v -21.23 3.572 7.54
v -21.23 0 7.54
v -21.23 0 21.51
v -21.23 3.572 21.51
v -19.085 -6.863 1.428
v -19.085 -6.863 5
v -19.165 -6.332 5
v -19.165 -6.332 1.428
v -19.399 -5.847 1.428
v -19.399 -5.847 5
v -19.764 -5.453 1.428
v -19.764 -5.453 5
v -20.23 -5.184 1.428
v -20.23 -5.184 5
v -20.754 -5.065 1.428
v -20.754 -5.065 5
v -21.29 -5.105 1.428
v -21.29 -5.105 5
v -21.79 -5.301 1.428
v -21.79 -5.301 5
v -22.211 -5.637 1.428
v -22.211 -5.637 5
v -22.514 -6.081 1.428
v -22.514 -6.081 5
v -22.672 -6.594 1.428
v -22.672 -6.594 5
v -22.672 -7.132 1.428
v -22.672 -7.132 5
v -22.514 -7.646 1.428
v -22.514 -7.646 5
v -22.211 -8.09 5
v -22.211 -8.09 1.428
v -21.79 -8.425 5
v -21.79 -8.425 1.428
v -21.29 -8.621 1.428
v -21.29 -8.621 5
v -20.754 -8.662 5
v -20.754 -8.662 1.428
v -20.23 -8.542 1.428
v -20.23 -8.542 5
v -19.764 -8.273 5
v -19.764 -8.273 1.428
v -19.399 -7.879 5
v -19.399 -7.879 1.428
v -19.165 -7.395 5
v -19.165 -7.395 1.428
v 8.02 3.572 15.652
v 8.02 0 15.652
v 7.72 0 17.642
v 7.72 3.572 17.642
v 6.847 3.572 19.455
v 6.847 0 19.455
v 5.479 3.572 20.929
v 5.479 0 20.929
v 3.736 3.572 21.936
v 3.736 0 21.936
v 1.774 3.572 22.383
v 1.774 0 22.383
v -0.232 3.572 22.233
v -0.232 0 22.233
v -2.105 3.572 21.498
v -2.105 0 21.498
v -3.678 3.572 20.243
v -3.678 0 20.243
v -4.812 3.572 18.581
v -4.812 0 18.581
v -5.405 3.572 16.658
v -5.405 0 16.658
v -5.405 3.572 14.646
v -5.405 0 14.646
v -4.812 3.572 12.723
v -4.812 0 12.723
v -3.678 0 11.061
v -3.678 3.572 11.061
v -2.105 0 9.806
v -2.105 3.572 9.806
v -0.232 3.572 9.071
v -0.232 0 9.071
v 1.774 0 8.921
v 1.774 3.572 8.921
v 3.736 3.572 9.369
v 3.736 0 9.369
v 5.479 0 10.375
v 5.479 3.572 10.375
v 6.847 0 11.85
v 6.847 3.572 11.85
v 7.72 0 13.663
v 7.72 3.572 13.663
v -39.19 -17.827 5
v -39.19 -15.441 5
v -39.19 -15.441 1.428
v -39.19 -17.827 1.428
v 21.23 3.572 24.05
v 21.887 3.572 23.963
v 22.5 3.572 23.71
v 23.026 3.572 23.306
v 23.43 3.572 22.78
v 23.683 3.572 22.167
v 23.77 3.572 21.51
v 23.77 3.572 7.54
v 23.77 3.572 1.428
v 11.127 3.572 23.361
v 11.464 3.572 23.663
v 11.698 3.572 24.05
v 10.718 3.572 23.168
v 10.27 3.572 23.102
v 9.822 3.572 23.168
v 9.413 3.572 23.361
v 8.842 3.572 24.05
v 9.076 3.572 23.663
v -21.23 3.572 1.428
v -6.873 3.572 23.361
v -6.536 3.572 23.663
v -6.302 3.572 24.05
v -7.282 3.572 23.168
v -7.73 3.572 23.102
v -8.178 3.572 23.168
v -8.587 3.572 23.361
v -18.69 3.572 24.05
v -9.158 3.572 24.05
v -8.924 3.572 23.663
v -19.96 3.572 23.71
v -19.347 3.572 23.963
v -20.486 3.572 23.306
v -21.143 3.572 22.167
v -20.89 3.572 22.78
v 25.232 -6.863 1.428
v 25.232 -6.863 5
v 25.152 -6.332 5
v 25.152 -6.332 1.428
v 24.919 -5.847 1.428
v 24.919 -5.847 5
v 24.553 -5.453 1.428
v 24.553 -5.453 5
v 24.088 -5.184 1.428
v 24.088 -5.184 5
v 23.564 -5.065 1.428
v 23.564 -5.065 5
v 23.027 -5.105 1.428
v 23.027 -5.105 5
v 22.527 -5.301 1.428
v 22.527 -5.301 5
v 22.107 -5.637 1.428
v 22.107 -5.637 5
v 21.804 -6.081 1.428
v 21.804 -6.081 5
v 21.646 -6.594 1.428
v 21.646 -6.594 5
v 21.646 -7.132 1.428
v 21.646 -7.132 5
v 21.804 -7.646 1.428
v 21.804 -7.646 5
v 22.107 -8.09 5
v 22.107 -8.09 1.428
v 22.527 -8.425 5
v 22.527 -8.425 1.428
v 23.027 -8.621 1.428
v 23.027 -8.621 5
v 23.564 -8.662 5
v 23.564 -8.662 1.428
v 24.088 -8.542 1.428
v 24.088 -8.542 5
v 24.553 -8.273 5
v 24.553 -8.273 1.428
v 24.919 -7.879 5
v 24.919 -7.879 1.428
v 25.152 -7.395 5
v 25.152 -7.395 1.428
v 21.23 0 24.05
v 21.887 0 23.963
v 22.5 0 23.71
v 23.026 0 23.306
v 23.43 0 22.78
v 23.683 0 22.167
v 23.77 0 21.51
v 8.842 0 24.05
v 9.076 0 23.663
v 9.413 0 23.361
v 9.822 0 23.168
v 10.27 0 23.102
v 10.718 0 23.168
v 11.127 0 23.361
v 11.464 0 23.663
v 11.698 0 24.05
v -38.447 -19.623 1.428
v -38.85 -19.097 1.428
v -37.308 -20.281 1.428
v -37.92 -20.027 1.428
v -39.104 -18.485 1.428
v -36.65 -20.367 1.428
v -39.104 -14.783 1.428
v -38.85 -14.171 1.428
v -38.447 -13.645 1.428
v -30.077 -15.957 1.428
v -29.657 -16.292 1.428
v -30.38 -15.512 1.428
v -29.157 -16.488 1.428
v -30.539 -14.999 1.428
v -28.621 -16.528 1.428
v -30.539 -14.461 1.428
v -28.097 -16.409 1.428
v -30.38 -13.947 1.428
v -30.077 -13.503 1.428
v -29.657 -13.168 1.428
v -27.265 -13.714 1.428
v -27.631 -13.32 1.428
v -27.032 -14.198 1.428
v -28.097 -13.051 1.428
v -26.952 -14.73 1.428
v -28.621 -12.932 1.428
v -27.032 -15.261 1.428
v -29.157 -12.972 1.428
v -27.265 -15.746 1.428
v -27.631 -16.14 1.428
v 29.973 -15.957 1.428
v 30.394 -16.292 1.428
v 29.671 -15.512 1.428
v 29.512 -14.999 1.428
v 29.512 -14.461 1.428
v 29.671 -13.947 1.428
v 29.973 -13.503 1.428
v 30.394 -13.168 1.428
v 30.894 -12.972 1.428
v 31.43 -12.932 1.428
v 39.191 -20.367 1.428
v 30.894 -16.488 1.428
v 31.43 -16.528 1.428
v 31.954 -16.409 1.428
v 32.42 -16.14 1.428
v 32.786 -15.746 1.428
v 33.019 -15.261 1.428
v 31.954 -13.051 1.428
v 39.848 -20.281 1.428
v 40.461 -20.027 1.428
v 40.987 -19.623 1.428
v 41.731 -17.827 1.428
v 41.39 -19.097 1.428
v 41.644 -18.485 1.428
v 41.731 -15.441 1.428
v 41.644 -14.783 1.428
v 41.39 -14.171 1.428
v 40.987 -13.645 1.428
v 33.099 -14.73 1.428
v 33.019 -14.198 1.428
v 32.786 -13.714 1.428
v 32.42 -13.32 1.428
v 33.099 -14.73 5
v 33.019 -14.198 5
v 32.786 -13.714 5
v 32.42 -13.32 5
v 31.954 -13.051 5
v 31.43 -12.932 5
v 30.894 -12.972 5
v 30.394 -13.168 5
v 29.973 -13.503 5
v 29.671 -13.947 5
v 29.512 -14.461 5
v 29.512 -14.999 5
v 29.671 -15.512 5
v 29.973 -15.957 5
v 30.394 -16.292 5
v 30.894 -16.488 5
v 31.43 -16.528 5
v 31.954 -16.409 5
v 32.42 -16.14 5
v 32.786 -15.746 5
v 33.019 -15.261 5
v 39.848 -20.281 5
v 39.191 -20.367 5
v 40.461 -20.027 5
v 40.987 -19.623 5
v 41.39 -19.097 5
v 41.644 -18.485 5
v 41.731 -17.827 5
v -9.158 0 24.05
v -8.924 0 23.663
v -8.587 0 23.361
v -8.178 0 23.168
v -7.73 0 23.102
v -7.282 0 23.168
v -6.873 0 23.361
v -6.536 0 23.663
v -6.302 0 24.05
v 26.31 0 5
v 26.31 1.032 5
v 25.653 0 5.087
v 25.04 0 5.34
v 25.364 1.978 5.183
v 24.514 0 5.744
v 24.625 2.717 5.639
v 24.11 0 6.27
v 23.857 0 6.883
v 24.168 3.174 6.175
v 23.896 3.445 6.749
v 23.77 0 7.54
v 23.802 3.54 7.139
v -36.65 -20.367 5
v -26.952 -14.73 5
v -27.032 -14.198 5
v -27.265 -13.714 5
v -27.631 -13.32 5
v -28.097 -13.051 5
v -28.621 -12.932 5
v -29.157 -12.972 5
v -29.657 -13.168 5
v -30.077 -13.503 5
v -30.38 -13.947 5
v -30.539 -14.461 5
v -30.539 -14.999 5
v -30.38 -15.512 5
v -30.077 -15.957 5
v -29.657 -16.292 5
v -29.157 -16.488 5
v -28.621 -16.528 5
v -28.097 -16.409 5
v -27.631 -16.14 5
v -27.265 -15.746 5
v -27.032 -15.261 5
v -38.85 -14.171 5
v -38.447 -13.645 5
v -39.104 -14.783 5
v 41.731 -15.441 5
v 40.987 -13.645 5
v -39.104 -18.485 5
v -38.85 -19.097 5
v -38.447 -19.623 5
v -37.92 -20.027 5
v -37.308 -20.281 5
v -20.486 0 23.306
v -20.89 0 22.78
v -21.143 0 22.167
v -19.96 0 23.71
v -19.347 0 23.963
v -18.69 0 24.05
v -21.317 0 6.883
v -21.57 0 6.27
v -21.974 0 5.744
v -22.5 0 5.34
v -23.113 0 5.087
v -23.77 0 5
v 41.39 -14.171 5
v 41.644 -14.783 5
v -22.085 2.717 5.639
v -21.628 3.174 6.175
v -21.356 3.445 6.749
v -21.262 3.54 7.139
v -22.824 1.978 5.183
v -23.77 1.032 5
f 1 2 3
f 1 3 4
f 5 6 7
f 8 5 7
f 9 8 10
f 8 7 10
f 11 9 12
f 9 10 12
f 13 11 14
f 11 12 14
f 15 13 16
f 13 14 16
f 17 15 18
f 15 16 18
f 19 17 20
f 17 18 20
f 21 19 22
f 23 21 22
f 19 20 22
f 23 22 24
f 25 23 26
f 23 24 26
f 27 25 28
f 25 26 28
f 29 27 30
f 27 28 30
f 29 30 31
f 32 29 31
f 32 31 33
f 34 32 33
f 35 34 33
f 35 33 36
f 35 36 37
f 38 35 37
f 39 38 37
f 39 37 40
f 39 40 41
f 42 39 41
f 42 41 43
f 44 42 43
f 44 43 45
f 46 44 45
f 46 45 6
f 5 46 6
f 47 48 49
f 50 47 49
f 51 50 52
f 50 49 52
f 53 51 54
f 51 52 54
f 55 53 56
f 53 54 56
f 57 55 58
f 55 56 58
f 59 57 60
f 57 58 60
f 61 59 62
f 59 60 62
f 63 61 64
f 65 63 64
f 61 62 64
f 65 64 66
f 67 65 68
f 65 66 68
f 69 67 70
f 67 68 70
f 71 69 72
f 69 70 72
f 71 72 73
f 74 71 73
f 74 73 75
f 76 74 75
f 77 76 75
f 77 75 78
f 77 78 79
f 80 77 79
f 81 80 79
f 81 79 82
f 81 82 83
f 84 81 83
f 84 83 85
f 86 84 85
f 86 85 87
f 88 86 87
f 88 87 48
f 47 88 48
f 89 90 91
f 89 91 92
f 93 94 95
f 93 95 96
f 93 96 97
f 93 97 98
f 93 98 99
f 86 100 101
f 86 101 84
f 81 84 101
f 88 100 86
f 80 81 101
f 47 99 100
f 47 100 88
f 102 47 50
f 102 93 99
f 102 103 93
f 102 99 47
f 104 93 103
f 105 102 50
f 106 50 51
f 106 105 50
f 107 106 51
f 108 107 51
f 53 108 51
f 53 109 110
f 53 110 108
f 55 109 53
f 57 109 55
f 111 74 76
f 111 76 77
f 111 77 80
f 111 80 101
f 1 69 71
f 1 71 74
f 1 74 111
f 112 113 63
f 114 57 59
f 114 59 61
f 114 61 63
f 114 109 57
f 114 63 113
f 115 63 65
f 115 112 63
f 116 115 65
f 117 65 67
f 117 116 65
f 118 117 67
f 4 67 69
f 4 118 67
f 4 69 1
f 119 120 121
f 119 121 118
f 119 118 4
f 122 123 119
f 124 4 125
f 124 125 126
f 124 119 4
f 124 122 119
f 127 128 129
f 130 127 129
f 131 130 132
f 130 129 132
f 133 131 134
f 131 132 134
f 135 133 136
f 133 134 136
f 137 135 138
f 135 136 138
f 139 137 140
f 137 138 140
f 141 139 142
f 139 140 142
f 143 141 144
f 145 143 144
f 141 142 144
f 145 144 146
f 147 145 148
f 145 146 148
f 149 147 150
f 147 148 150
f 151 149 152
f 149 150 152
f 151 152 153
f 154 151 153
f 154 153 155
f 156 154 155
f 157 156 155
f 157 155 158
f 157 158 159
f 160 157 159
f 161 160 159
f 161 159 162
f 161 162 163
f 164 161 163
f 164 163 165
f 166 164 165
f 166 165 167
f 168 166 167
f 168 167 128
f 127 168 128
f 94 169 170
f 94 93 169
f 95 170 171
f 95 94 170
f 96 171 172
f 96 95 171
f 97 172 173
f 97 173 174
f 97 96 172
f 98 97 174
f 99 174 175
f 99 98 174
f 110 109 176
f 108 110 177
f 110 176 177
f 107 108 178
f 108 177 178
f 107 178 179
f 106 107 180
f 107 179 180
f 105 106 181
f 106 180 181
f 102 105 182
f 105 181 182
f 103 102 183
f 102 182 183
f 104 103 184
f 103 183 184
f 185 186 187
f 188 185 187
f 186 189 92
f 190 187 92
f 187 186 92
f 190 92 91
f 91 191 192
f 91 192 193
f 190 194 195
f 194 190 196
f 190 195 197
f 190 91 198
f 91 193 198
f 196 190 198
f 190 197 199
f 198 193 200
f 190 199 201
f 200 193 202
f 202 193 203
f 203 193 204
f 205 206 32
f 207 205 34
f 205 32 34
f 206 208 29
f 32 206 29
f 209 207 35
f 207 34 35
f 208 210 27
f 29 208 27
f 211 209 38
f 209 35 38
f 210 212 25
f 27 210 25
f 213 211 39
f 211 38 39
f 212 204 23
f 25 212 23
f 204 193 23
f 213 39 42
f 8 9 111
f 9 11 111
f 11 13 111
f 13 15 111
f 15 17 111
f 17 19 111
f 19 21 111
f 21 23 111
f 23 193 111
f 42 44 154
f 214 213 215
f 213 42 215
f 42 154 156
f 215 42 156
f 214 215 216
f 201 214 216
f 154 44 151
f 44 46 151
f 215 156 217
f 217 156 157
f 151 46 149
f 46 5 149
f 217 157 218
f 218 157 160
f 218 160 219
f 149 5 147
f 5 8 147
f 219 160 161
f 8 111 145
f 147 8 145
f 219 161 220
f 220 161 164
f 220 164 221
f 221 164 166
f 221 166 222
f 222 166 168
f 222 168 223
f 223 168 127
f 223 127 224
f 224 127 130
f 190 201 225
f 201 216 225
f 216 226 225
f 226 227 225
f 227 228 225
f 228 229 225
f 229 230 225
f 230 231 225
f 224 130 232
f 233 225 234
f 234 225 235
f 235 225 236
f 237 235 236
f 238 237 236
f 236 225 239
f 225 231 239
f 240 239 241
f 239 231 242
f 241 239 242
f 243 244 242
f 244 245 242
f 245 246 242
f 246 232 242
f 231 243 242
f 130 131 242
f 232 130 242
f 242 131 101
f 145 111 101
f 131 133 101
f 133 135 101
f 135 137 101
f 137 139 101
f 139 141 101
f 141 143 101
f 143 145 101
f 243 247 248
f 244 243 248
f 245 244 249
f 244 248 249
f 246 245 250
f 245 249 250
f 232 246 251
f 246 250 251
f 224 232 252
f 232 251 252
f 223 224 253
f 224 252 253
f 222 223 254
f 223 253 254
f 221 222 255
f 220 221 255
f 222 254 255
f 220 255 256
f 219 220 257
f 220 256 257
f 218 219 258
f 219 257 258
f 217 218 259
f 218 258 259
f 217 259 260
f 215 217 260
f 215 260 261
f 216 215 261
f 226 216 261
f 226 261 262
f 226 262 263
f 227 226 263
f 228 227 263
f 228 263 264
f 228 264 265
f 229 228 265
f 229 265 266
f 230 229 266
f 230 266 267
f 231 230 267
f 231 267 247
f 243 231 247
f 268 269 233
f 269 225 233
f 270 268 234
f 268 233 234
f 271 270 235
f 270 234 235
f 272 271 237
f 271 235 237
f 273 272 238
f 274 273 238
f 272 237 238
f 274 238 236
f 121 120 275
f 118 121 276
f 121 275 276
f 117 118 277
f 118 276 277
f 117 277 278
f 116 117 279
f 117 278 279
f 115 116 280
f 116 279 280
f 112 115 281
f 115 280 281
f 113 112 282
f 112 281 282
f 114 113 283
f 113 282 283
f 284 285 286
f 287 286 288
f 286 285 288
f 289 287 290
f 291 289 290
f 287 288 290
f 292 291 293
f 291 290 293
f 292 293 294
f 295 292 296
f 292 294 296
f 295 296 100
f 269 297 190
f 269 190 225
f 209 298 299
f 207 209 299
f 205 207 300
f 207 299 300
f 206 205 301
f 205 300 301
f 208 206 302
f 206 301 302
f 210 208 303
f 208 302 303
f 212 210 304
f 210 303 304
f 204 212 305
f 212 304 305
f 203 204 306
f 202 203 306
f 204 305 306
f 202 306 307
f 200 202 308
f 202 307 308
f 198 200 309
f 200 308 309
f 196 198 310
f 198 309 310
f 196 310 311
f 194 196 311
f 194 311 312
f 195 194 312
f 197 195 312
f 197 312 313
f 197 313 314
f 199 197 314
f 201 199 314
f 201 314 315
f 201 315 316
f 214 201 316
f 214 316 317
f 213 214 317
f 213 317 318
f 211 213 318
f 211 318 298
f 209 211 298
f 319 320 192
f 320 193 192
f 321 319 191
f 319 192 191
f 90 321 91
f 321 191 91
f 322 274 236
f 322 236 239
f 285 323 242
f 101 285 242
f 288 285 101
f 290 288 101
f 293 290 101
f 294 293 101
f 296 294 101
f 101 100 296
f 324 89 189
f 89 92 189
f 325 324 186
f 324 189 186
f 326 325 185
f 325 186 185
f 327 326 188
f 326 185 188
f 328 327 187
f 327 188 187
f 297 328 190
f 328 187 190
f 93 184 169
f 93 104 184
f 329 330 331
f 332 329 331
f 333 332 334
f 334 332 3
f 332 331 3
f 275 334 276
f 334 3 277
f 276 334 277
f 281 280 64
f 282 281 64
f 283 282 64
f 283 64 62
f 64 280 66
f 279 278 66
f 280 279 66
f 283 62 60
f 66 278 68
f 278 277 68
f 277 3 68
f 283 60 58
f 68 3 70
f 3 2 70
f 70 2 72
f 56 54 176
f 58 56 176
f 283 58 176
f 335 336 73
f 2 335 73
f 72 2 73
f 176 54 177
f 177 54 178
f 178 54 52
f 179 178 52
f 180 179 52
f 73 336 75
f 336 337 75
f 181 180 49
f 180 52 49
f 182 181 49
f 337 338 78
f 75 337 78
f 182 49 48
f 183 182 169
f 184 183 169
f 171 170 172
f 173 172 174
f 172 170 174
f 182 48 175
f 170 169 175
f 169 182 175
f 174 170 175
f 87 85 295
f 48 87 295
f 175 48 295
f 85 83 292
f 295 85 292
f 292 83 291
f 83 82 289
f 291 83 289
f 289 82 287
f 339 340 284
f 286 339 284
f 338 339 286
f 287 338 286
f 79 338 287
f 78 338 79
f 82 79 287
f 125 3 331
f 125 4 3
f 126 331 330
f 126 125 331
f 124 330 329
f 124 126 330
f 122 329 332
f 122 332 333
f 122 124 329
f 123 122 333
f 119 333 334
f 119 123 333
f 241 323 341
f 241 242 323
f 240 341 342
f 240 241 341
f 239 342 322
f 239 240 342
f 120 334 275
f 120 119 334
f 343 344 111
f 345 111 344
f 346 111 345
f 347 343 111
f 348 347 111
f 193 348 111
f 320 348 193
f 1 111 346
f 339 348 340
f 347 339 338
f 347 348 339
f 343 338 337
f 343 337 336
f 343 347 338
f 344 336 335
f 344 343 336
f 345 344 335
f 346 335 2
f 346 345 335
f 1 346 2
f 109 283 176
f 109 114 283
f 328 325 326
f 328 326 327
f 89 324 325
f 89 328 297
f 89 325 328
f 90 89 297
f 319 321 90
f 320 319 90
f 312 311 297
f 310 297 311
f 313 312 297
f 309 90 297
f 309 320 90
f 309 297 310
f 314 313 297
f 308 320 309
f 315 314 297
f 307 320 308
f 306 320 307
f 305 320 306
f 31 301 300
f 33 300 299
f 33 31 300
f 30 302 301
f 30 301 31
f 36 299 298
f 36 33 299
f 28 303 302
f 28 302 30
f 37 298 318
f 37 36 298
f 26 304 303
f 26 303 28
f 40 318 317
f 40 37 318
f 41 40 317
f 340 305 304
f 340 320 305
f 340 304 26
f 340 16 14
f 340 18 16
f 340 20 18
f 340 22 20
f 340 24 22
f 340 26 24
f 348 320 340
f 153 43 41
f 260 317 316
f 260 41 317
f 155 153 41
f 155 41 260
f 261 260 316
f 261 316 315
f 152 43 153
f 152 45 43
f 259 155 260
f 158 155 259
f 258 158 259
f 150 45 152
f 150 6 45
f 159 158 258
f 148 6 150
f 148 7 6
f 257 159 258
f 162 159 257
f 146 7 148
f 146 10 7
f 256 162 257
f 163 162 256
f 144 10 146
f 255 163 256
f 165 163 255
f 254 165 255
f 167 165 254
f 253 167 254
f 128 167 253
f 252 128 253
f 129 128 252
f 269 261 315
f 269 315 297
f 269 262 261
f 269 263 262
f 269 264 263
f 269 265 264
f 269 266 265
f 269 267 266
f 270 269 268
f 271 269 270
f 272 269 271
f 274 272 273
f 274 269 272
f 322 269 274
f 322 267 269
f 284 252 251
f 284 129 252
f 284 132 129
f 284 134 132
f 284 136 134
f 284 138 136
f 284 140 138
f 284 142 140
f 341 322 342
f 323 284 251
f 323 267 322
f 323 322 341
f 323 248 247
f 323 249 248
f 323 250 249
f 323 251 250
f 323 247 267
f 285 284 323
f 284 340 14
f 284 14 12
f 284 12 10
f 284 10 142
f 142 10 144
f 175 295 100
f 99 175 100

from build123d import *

# Parameters (mm, degrees)
BOSS_EXTRUDE1_DEPTH     = 3.571875
SKETCH2_W               = 45
SKETCH2_H               = 3.571875
BOSS_EXTRUDE2_DEPTH     = 19.05
FILLET1_R               = 2
SKETCH9_W               = 44.9012818
SKETCH9_H               = 1.417156311
CUT_EXTRUDE1_DEPTH      = 10
BOSS_EXTRUDE3_DEPTH     = 3.571875
SKETCH14_R              = 1.8034
CUT_EXTRUDE4_DEPTH      = 4.571875
FILLET3_R               = 2.54
SKETCH15_R              = 6.75
SKETCH15_R_2            = 1.55
CUT_EXTRUDE5_DEPTH      = 21.367363974
CUT_EXTRUDE5_DEPTH_BACK = 4.571875


with BuildPart() as part:
    # Sketch1 → Boss-Extrude1 (new body)
    with BuildSketch(Plane.XY.offset(5)):
        with BuildLine():
            Line((-21.183407813, 0), (-21.183407813, -8.813455393))
            ThreePointArc((-21.183407813, -8.813455393), (-22.866221682, -12.686440931), (-19.530849883, -15.276262248))
            Line((-19.530849883, -15.276262248), (24.68248716, -15.276262248))
            ThreePointArc((24.68248716, -15.276262248), (25.214329472, -14.744419936), (24.68248716, -14.212577623))
            Line((24.68248716, -14.212577623), (23.717873987, 0))
            Line((23.717873987, 0), (23.717873987, 4.989031311))
            Line((23.717873987, 4.989031311), (-21.183407813, 4.989031311))
            Line((-21.183407813, 4.989031311), (-21.183407813, 0))
        make_face()
    extrude(amount=-BOSS_EXTRUDE1_DEPTH)

    # Sketch2 → Boss-Extrude2 (add)
    with BuildSketch(Plane.XY.offset(5)):
        with Locations((1.270019176, 1.7859375)):
            Rectangle(SKETCH2_W, SKETCH2_H)
    extrude(amount=BOSS_EXTRUDE2_DEPTH)

    # Fillet1
    fillet1_edges = [part.edges().sort_by_distance(p)[0] for p in [
        (1.267233087, 4.989031311, 1.428125),
    ]]
    fillet(fillet1_edges, radius=FILLET1_R)

    # Sketch9 → Cut-Extrude1 (cut)
    with BuildSketch(Plane.XY.offset(5)):
        with Locations((1.267233087, 4.280453156)):
            Rectangle(SKETCH9_W, SKETCH9_H)
    extrude(amount=-CUT_EXTRUDE1_DEPTH, mode=Mode.SUBTRACT)

    # Sketch13 → Boss-Extrude3 (add, through all)
    with BuildSketch(Plane.XY.offset(5)):
        Polygon((-21.229980824, 3.571875), (-39.190493066, -14.388637242), (-39.190493066, -20.367363974), (41.730531418, -20.367363974), (41.730531418, -14.388637242), (23.770019176, 3.571875), align=None)
    extrude(amount=-BOSS_EXTRUDE3_DEPTH)

    # Sketch14 → Cut-Extrude4 (cut, through all)
    with BuildSketch(Plane.XY.offset(5)):
        with Locations((-28.755435454, -14.729886975)):
            Circle(SKETCH14_R)
        with Locations((-20.888731092, -6.863182613)):
            Circle(SKETCH14_R)
        with Locations((23.428769443, -6.863182613)):
            Circle(SKETCH14_R)
        with Locations((31.295473805, -14.729886975)):
            Circle(SKETCH14_R)
    extrude(amount=-CUT_EXTRUDE4_DEPTH, mode=Mode.SUBTRACT)

    # Fillet3
    fillet3_edges = [part.edges().sort_by_distance(p)[0] for p in [
        (23.770019176, 1.7859375, 5),
        (-21.229980824, 1.7859375, 5),
        (23.770019176, 1.7859375, 24.05),
        (-21.229980824, 1.7859375, 24.05),
        (41.730531418, -20.367363974, 3.2140625),
        (-39.190493066, -20.367363974, 3.2140625),
        (-39.190493066, -14.388637242, 3.2140625),
        (41.730531418, -14.388637242, 3.2140625),
    ]]
    fillet(fillet3_edges, radius=FILLET3_R)

    # Sketch15 → Cut-Extrude5 (cut, two sides)
    with BuildSketch(Plane.XZ) as cut_extrude5_sk:
        with Locations((1.270019176, 15.652125)):
            Circle(SKETCH15_R)
        with Locations((-7.729980824, 24.652125)):
            Circle(SKETCH15_R_2)
        with Locations((10.270019176, 24.652125)):
            Circle(SKETCH15_R_2)
    extrude(amount=CUT_EXTRUDE5_DEPTH, mode=Mode.SUBTRACT)
    extrude(cut_extrude5_sk.sketch, amount=-CUT_EXTRUDE5_DEPTH_BACK, mode=Mode.SUBTRACT)


solid = part.part
